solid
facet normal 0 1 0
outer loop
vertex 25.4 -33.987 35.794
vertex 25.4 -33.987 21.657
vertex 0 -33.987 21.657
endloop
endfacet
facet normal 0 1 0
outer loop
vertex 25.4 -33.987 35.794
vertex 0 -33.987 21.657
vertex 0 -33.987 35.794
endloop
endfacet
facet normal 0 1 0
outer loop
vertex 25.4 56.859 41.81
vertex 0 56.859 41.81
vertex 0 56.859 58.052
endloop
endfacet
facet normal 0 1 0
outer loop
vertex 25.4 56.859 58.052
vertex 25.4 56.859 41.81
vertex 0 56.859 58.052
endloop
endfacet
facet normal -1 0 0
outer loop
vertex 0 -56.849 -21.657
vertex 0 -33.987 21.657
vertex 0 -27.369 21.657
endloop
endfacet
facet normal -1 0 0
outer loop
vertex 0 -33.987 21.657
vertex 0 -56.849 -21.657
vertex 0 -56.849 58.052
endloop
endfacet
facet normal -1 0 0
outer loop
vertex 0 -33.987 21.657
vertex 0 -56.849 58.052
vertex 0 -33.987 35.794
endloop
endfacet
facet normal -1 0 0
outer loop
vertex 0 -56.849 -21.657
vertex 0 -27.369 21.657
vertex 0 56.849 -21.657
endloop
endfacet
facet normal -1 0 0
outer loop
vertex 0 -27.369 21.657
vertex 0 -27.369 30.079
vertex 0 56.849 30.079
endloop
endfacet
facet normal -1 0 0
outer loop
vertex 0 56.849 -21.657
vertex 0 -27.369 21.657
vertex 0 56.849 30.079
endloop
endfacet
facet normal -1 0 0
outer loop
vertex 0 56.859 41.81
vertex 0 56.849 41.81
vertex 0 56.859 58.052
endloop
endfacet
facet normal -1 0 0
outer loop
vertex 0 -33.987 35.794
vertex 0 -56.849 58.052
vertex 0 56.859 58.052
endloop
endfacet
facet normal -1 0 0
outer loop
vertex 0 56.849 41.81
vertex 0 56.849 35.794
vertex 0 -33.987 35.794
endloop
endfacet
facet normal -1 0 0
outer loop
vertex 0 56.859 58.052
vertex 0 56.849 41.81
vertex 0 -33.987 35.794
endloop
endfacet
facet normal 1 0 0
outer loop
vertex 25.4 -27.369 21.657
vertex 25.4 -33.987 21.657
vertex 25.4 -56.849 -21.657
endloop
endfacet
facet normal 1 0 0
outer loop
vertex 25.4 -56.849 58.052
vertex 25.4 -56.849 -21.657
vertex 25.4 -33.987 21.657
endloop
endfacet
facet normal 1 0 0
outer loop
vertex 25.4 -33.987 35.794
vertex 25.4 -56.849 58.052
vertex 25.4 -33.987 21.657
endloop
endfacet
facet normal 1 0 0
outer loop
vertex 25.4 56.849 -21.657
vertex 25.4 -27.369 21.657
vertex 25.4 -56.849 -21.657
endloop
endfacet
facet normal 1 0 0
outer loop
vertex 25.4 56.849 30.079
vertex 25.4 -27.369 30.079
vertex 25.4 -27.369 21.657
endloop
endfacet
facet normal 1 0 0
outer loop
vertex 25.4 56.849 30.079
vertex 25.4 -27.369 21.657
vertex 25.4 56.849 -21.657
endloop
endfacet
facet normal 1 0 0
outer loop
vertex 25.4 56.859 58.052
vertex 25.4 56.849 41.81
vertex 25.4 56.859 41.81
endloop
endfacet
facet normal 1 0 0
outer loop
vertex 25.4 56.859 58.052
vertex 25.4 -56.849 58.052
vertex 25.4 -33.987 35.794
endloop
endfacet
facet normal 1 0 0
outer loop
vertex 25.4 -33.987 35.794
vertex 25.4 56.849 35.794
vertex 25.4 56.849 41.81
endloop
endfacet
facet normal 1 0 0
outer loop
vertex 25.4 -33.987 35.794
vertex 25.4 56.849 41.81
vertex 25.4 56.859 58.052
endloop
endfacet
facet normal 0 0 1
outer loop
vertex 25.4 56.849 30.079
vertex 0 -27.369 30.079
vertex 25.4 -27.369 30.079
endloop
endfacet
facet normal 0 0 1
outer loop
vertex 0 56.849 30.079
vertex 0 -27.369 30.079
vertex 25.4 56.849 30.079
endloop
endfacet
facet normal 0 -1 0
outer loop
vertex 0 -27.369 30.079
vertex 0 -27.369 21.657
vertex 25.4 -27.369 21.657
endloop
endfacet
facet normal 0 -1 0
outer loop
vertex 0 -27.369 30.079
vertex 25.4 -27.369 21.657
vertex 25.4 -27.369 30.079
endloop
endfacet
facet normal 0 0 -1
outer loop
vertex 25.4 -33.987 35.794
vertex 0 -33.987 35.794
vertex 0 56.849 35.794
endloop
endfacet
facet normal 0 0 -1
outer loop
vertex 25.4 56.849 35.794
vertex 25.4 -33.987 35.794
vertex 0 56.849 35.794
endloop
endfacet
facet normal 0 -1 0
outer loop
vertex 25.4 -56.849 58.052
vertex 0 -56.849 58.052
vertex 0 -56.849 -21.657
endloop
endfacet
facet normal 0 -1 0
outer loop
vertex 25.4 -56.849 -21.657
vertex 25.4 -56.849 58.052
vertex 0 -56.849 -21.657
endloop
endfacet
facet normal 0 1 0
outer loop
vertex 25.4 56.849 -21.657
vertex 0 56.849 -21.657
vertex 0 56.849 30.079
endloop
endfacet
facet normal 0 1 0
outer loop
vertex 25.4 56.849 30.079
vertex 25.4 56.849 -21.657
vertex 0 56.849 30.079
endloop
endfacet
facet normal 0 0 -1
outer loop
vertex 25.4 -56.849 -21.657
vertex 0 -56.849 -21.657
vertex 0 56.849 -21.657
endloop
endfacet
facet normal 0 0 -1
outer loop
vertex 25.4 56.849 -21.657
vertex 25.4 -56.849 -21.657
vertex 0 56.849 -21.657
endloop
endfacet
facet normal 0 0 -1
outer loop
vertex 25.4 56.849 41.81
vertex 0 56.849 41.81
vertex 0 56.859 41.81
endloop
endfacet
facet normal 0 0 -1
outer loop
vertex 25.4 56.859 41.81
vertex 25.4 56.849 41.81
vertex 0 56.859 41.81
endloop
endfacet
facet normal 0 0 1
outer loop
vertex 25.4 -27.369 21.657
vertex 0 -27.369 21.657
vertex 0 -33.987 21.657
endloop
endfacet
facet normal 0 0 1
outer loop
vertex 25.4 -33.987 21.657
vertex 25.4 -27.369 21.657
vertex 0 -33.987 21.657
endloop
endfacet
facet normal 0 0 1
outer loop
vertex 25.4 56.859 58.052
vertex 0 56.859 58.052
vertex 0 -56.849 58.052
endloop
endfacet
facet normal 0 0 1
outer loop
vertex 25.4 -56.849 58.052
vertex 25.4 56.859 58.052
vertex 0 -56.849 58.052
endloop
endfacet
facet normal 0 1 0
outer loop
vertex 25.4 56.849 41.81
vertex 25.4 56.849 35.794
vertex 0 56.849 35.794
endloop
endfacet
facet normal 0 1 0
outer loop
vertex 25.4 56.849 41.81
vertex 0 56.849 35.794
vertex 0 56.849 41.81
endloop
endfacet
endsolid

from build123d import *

# Parameters (mm, degrees)
F0_W     = 22.8618904948
F0_H     = 16.2426307797
F0_W_2   = 84.2182151973
F0_H_2   = 8.4221046418
F0_W_3   = 90.8361300826
F0_H_3   = 6.0157887638
F1_DEPTH = 25.4


with BuildPart() as f1:
    # F0 (on Right) → F1 (new body)
    with BuildSketch(Plane.YZ):
        Polygon((-56.8490102887, 41.8097376823), (-56.8490102887, 21.6568410397), (-33.9871197939, 21.6568410397), (-33.9871197939, 35.7939489186), (-33.9871197939, 41.8097376823), align=None)
        Polygon((-33.9871197939, 21.6568410397), (-56.8490102887, 21.6568410397), (-56.8490102887, -21.6568410397), (56.8490102887, -21.6568410397), (56.8490102887, -11.5302624181), (56.8490102887, 21.6568410397), (-27.3692049086, 21.6568410397), align=None)
        with Locations((-45.4180650413, 49.9310530722)):
            Rectangle(F0_W, F0_H)
        with Locations((14.7399026901, 25.8678933606)):
            Rectangle(F0_W_2, F0_H_2)
        with Locations((11.4309452474, 38.8018433005)):
            Rectangle(F0_W_3, F0_H_3)
        Polygon((-33.9871197939, 58.0523684621), (-33.9871197939, 41.8097376823), (56.8490102887, 41.8097376823), (56.8588115275, 41.8097376823), (56.8588115275, 58.0523684621), align=None)
    extrude(amount=F1_DEPTH)


solid = f1.part
